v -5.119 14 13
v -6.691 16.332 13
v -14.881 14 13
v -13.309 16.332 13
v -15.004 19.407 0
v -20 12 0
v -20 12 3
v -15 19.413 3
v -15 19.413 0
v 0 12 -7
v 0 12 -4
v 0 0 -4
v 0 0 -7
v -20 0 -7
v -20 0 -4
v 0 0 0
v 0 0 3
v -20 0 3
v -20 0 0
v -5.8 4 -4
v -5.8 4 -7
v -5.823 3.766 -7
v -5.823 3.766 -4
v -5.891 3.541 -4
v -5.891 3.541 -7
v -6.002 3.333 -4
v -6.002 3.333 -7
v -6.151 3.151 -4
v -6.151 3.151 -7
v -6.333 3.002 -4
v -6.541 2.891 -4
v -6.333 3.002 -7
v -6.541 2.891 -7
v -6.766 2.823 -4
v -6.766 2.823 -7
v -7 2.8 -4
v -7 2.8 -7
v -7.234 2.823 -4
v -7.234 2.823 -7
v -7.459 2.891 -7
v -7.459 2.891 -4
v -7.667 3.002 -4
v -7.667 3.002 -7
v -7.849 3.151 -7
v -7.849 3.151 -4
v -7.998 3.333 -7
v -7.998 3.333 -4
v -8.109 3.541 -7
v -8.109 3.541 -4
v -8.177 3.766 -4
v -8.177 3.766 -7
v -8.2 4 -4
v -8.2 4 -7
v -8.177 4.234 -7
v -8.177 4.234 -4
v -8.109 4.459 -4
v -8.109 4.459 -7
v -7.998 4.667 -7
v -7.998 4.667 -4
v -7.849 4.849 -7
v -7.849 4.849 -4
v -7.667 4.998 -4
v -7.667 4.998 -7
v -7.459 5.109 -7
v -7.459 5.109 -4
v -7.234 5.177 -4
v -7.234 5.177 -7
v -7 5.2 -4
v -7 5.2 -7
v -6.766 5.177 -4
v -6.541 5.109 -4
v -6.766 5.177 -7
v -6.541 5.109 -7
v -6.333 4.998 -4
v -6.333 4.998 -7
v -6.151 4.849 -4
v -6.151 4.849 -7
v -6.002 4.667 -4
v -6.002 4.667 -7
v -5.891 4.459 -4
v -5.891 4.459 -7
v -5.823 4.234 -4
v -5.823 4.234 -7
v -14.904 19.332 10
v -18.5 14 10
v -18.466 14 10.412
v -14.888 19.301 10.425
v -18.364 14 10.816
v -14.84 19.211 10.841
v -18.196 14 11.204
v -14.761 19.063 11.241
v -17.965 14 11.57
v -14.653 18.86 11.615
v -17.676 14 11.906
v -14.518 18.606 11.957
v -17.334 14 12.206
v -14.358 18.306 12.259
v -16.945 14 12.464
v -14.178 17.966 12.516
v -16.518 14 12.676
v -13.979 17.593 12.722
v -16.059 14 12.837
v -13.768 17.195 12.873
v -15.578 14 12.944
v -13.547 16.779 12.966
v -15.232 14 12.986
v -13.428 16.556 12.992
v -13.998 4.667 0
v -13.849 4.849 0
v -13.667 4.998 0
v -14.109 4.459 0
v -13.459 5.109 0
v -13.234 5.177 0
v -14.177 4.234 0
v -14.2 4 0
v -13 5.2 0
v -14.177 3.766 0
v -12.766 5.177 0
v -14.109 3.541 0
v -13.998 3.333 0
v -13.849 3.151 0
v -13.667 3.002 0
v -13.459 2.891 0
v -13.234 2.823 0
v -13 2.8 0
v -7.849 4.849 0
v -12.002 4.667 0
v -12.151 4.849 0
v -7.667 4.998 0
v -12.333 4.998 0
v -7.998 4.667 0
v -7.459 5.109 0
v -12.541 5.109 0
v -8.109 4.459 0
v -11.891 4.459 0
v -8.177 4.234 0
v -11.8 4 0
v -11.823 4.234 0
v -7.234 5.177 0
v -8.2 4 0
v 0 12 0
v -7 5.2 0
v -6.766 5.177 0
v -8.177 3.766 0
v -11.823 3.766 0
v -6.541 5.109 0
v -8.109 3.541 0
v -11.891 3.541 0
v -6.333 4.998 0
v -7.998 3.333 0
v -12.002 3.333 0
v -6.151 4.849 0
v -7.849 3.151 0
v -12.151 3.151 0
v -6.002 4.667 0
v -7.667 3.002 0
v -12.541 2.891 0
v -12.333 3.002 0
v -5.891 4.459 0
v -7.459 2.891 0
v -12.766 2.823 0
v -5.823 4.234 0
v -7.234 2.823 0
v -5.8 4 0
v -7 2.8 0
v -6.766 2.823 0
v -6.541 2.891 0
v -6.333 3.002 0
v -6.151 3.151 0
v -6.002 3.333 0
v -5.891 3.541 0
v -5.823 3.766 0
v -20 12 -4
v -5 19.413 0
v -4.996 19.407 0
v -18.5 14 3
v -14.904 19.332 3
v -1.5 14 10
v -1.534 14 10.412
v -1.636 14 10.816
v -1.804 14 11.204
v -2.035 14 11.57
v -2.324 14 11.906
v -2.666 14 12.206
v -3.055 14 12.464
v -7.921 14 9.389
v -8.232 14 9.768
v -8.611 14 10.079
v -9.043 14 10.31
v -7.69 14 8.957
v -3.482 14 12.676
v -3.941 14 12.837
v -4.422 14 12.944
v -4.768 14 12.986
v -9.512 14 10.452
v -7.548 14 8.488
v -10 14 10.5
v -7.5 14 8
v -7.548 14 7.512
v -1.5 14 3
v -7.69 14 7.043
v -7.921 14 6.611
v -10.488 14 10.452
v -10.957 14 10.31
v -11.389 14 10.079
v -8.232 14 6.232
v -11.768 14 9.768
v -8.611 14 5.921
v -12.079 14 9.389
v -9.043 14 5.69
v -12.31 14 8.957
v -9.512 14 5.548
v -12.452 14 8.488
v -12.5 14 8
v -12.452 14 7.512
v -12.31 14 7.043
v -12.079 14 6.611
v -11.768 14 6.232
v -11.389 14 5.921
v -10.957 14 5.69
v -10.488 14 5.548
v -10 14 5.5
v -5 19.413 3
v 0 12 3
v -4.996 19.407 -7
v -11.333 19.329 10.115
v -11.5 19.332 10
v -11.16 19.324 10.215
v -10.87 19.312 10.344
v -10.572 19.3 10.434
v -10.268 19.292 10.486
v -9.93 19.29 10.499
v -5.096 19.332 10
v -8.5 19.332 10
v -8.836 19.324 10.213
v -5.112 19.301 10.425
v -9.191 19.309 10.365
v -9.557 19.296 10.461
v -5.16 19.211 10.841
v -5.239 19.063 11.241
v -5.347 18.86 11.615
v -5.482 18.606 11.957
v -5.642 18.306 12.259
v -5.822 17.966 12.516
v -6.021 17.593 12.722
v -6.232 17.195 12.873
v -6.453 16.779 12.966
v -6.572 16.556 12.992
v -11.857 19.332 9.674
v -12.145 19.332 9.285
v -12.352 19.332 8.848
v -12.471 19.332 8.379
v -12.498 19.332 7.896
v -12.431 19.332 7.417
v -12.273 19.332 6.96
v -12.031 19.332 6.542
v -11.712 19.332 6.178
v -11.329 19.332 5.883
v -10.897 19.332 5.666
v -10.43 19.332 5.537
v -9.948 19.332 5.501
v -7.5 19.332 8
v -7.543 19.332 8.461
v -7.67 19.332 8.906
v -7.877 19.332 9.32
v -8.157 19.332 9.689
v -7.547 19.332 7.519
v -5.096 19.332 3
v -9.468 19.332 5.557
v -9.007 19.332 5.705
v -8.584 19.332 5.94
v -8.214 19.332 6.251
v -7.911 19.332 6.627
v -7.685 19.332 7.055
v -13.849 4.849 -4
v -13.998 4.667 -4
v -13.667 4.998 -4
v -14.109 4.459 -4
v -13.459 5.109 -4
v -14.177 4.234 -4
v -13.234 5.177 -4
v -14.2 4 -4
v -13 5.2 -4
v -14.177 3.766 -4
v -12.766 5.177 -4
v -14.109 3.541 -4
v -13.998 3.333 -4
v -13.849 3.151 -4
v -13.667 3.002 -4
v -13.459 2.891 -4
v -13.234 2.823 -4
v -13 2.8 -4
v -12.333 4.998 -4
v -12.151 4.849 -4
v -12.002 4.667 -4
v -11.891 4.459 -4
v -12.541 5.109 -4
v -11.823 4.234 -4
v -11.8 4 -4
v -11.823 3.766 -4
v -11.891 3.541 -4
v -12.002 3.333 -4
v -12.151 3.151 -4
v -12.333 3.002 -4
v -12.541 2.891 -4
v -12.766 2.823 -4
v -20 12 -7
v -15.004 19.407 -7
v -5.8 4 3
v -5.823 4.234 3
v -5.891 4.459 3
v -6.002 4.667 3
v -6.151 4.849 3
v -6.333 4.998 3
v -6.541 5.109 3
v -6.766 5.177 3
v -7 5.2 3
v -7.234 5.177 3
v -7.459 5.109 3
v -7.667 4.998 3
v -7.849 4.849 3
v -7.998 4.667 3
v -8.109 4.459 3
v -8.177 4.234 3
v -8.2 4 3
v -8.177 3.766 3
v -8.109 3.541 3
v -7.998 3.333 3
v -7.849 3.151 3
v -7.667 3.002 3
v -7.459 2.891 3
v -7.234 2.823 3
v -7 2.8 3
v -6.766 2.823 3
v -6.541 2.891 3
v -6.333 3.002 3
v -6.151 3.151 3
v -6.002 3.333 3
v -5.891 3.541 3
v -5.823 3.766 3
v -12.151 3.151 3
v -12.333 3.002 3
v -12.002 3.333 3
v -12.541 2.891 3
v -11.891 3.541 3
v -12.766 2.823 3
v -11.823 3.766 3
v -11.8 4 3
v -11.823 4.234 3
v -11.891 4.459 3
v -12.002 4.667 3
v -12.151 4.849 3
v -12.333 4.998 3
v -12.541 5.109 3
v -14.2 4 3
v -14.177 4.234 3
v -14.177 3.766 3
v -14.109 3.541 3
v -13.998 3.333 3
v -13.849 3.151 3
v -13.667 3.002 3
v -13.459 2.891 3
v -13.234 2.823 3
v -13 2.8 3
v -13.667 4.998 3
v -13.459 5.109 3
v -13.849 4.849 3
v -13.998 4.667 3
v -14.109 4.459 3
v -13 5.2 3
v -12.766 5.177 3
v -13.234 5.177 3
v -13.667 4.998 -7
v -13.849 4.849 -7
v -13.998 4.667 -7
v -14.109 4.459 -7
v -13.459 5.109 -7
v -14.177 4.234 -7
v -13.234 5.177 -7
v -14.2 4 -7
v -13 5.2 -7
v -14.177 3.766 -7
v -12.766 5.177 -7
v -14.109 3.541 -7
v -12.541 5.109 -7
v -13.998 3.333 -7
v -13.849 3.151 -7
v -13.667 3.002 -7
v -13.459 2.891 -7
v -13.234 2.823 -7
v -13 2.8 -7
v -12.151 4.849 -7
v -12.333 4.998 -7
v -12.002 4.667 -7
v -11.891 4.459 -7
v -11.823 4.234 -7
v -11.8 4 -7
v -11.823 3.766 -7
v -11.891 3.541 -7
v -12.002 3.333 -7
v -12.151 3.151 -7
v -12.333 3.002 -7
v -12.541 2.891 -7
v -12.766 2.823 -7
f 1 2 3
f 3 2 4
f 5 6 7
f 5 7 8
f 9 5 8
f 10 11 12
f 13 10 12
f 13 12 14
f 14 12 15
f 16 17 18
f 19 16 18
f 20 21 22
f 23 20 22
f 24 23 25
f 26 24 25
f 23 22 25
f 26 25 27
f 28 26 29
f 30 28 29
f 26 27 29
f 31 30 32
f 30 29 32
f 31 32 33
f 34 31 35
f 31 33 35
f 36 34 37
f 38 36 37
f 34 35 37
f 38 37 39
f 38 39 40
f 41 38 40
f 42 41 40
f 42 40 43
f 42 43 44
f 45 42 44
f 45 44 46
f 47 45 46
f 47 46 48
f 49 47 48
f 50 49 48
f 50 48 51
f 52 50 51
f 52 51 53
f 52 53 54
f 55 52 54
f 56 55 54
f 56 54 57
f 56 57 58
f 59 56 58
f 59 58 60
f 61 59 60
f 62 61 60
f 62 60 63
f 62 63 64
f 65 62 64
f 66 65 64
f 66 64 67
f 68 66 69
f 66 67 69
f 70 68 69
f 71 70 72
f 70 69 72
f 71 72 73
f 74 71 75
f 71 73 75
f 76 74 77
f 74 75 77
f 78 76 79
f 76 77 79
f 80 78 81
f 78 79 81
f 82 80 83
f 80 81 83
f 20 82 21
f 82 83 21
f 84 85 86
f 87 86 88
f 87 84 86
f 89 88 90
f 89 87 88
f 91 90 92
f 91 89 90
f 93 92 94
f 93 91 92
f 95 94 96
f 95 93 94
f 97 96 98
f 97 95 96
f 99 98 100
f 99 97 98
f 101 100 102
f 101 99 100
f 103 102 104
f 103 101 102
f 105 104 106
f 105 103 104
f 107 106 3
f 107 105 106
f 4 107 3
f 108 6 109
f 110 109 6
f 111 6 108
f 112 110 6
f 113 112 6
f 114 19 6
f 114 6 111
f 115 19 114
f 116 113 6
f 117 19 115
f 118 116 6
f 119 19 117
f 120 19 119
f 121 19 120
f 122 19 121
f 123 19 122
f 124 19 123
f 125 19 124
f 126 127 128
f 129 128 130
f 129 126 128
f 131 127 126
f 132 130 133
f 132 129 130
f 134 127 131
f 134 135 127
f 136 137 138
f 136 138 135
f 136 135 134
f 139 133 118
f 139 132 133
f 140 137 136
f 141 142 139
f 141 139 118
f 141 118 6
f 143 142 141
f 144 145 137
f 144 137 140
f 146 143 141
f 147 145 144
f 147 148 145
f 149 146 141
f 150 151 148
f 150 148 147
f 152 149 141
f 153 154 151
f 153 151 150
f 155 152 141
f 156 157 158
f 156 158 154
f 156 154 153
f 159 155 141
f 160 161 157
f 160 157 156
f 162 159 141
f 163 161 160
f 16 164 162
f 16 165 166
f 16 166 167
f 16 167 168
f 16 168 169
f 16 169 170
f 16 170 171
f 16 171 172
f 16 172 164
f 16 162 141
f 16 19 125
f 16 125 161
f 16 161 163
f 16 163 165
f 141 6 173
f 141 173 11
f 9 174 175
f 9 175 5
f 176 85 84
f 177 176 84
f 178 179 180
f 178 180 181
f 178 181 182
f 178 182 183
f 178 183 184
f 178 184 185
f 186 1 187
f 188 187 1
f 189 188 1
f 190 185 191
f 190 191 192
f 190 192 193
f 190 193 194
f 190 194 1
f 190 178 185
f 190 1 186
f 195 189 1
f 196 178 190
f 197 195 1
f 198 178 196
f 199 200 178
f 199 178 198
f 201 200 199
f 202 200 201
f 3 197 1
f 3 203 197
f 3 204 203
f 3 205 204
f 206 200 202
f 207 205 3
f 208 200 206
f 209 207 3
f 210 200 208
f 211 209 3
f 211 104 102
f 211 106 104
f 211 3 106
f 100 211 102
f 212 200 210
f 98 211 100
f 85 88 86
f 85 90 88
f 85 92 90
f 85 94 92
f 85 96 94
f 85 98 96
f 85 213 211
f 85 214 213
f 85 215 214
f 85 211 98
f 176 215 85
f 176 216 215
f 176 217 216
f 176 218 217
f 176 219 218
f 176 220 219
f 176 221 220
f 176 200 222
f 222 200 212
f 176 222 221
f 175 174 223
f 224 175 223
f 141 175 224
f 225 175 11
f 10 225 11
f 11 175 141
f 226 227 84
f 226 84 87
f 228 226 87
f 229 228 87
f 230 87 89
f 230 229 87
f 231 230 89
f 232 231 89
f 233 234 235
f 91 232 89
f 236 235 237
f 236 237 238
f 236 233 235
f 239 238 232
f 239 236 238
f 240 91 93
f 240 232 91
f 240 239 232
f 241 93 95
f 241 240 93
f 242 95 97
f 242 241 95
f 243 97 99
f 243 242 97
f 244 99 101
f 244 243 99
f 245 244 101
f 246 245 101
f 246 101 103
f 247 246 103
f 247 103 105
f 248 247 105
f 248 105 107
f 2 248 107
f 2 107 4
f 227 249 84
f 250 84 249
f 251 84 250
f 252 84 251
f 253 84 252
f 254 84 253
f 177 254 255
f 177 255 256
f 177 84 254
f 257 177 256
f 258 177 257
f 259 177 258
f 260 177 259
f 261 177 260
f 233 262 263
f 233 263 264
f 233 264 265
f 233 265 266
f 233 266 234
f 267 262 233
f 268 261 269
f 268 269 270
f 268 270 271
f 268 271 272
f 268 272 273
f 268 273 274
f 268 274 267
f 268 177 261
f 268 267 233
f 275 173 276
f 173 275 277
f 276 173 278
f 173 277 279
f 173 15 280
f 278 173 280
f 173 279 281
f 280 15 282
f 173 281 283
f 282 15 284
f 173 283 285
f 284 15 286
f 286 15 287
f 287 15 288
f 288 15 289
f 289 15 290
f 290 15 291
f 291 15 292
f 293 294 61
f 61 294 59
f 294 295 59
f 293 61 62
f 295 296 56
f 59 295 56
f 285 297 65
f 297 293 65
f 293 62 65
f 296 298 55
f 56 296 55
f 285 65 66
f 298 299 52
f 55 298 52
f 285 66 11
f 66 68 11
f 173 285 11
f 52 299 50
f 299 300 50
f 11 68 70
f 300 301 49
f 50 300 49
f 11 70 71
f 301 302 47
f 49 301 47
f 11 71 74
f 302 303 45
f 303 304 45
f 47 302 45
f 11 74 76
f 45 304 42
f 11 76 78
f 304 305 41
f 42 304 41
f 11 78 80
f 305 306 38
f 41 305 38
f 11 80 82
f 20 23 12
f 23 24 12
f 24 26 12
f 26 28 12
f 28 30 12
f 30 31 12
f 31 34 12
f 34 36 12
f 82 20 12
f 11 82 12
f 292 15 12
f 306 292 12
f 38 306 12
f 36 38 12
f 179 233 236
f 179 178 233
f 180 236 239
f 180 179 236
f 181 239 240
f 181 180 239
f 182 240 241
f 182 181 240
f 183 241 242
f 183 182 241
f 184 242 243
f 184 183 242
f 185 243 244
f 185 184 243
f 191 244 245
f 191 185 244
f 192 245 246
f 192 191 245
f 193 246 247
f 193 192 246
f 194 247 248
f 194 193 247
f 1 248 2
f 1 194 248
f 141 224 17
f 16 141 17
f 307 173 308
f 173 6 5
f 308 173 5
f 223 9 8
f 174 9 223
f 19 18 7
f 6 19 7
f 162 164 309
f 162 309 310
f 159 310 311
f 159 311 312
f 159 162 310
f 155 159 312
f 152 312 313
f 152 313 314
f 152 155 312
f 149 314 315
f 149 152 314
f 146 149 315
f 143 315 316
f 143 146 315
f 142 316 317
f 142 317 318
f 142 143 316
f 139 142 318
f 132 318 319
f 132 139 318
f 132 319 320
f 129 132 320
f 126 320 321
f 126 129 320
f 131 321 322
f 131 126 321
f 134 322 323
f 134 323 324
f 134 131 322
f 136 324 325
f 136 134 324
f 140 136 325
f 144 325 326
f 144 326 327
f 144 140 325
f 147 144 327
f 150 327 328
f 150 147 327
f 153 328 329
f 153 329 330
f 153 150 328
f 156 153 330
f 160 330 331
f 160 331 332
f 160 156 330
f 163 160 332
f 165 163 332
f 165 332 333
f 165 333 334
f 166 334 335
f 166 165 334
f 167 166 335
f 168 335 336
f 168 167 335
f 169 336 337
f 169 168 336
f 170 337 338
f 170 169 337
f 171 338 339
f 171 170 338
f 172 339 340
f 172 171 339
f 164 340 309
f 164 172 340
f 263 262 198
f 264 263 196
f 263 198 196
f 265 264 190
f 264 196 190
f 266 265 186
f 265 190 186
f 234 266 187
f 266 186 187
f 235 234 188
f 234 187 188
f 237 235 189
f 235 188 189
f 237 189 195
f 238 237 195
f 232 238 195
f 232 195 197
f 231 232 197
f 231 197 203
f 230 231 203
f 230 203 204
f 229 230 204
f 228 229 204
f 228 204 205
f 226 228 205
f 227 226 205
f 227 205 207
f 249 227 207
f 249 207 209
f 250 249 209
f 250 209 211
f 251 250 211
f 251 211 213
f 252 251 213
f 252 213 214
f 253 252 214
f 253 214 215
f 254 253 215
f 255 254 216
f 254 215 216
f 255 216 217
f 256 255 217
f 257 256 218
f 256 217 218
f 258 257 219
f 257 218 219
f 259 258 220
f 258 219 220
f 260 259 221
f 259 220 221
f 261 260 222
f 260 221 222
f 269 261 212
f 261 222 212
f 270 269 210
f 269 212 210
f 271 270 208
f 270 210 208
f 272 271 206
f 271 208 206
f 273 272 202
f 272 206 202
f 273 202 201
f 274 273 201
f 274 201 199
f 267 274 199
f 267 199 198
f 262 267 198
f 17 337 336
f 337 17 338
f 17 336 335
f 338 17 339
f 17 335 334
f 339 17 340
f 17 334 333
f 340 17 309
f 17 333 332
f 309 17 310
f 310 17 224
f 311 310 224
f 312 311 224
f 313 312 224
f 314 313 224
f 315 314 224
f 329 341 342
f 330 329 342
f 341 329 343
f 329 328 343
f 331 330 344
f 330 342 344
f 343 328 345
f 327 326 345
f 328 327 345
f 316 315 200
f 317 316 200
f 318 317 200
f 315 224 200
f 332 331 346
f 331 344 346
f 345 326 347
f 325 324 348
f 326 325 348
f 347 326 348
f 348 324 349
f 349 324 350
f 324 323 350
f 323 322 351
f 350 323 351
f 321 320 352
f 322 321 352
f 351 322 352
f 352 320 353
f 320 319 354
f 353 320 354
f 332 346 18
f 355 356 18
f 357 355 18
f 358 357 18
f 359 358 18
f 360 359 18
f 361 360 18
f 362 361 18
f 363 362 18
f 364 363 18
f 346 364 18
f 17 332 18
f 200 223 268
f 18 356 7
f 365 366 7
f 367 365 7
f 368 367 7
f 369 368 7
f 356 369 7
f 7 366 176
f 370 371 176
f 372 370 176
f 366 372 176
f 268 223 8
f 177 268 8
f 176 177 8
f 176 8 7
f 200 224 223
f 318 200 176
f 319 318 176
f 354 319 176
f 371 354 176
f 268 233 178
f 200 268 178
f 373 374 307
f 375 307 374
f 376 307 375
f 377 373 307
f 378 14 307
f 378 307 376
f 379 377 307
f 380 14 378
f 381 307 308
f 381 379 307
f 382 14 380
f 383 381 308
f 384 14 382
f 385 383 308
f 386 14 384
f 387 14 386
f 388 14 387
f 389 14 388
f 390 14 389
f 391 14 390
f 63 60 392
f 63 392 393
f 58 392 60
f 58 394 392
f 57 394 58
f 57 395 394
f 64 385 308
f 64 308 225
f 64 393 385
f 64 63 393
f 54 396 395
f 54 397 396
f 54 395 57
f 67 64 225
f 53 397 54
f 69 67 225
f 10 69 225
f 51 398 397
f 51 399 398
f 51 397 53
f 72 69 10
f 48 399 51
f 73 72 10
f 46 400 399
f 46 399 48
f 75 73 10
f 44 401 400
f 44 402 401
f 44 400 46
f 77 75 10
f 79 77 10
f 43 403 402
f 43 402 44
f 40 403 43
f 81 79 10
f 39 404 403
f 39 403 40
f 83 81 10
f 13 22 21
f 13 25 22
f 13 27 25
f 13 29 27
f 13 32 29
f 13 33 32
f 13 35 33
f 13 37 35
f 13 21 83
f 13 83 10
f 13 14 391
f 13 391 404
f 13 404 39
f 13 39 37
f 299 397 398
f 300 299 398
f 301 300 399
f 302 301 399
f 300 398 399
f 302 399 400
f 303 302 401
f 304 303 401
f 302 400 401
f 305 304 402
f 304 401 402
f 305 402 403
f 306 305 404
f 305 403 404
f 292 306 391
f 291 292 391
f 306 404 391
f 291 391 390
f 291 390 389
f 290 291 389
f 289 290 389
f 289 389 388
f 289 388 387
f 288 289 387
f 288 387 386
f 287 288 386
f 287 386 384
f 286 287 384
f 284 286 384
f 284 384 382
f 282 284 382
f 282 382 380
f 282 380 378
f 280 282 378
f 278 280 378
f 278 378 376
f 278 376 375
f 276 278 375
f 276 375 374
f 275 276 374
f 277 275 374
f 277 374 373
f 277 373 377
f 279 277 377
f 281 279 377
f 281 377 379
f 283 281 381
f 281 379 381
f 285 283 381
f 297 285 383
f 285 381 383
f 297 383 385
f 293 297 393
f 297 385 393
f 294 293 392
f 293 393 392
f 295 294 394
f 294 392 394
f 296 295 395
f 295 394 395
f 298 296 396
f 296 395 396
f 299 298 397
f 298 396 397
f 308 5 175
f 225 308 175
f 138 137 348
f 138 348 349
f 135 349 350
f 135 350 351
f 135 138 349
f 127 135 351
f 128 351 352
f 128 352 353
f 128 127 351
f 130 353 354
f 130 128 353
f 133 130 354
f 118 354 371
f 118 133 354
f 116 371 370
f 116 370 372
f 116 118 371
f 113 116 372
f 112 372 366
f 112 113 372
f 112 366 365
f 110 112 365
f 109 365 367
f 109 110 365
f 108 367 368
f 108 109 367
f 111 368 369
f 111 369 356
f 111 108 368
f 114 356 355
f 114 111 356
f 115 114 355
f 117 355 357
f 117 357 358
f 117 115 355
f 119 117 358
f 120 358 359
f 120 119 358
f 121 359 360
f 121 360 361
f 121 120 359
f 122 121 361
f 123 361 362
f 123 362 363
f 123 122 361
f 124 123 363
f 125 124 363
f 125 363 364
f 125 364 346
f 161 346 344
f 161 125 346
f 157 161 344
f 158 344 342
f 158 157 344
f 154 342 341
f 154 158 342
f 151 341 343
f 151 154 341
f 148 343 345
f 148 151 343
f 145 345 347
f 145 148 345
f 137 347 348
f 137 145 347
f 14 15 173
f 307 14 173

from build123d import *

# Parameters (mm, degrees)
SKETCH_R        = 1.2
PAD_DEPTH       = 3
PAD001_DEPTH    = 10
FILLET_R        = 3
SKETCH002_R     = 2.5
POCKET_DEPTH    = 6
PAD002_DEPTH    = 7
SKETCH004_W     = 20
SKETCH004_H     = 4
POCKET001_DEPTH = 12
SKETCH006_R     = 1.2
POCKET002_DEPTH = 5


with BuildPart() as part:
    # Sketch → Pad (new body)
    with BuildSketch(Plane.XY):
        Polygon((0, 12), (0, 0), (-20, 0), (-20, 12), (-15, 19.412805), (-5, 19.412805), align=None)
        with Locations((-13, 4)):
            Circle(SKETCH_R, mode=Mode.SUBTRACT)
        with Locations((-7, 4)):
            Circle(SKETCH_R, mode=Mode.SUBTRACT)
    extrude(amount=PAD_DEPTH)

    # Sketch001 (on Face10 of Pad) → Pad001 (join)
    with BuildSketch(Plane.XY.offset(3)):
        Polygon((-14.90374, 19.331674), (-5.09626, 19.331674), (-1.5, 14), (-18.5, 14), align=None)
    extrude(amount=PAD001_DEPTH)

    # Fillet
    fillet_edges = [part.edges().sort_by_distance(p)[0] for p in [
        (-3.29813, 16.665837, 13),
        (-10, 19.331674, 13),
        (-16.70187, 16.665837, 13),
    ]]
    fillet(fillet_edges, radius=FILLET_R)

    # Sketch002 (on Face12 of Pad001) → Pocket (cut)
    with BuildSketch(Plane.XZ.offset(-14)):
        with Locations((-10, 8)):
            Circle(SKETCH002_R)
    extrude(amount=-POCKET_DEPTH, mode=Mode.SUBTRACT)

    # Sketch003 (on Face19 of Pocket) → Pad002 (join)
    with BuildSketch(Plane(origin=(0, 0, 0), x_dir=(1, 0, 0), z_dir=(0, 0, -1))):
        Polygon((0, 0), (-20, 0), (-20, -12), (-15.004024, -19.406839), (-4.995976, -19.406839), (0, -12), align=None)
    extrude(amount=PAD002_DEPTH)

    # Sketch004 (on Face22 of Pad002) → Pocket001 (cut)
    with BuildSketch(Plane.XZ):
        with Locations((-10, -2)):
            Rectangle(SKETCH004_W, SKETCH004_H)
    extrude(amount=-POCKET001_DEPTH, mode=Mode.SUBTRACT)

    # Sketch006 (on Face26 of Pocket001) → Pocket002 (cut)
    with BuildSketch(Plane(origin=(0, 0, -7), x_dir=(1, 0, 0), z_dir=(0, 0, -1))):
        with Locations((-13, -4)):
            Circle(SKETCH006_R)
        with Locations((-7, -4)):
            Circle(SKETCH006_R)
    extrude(amount=-POCKET002_DEPTH, mode=Mode.SUBTRACT)


solid = part.part
